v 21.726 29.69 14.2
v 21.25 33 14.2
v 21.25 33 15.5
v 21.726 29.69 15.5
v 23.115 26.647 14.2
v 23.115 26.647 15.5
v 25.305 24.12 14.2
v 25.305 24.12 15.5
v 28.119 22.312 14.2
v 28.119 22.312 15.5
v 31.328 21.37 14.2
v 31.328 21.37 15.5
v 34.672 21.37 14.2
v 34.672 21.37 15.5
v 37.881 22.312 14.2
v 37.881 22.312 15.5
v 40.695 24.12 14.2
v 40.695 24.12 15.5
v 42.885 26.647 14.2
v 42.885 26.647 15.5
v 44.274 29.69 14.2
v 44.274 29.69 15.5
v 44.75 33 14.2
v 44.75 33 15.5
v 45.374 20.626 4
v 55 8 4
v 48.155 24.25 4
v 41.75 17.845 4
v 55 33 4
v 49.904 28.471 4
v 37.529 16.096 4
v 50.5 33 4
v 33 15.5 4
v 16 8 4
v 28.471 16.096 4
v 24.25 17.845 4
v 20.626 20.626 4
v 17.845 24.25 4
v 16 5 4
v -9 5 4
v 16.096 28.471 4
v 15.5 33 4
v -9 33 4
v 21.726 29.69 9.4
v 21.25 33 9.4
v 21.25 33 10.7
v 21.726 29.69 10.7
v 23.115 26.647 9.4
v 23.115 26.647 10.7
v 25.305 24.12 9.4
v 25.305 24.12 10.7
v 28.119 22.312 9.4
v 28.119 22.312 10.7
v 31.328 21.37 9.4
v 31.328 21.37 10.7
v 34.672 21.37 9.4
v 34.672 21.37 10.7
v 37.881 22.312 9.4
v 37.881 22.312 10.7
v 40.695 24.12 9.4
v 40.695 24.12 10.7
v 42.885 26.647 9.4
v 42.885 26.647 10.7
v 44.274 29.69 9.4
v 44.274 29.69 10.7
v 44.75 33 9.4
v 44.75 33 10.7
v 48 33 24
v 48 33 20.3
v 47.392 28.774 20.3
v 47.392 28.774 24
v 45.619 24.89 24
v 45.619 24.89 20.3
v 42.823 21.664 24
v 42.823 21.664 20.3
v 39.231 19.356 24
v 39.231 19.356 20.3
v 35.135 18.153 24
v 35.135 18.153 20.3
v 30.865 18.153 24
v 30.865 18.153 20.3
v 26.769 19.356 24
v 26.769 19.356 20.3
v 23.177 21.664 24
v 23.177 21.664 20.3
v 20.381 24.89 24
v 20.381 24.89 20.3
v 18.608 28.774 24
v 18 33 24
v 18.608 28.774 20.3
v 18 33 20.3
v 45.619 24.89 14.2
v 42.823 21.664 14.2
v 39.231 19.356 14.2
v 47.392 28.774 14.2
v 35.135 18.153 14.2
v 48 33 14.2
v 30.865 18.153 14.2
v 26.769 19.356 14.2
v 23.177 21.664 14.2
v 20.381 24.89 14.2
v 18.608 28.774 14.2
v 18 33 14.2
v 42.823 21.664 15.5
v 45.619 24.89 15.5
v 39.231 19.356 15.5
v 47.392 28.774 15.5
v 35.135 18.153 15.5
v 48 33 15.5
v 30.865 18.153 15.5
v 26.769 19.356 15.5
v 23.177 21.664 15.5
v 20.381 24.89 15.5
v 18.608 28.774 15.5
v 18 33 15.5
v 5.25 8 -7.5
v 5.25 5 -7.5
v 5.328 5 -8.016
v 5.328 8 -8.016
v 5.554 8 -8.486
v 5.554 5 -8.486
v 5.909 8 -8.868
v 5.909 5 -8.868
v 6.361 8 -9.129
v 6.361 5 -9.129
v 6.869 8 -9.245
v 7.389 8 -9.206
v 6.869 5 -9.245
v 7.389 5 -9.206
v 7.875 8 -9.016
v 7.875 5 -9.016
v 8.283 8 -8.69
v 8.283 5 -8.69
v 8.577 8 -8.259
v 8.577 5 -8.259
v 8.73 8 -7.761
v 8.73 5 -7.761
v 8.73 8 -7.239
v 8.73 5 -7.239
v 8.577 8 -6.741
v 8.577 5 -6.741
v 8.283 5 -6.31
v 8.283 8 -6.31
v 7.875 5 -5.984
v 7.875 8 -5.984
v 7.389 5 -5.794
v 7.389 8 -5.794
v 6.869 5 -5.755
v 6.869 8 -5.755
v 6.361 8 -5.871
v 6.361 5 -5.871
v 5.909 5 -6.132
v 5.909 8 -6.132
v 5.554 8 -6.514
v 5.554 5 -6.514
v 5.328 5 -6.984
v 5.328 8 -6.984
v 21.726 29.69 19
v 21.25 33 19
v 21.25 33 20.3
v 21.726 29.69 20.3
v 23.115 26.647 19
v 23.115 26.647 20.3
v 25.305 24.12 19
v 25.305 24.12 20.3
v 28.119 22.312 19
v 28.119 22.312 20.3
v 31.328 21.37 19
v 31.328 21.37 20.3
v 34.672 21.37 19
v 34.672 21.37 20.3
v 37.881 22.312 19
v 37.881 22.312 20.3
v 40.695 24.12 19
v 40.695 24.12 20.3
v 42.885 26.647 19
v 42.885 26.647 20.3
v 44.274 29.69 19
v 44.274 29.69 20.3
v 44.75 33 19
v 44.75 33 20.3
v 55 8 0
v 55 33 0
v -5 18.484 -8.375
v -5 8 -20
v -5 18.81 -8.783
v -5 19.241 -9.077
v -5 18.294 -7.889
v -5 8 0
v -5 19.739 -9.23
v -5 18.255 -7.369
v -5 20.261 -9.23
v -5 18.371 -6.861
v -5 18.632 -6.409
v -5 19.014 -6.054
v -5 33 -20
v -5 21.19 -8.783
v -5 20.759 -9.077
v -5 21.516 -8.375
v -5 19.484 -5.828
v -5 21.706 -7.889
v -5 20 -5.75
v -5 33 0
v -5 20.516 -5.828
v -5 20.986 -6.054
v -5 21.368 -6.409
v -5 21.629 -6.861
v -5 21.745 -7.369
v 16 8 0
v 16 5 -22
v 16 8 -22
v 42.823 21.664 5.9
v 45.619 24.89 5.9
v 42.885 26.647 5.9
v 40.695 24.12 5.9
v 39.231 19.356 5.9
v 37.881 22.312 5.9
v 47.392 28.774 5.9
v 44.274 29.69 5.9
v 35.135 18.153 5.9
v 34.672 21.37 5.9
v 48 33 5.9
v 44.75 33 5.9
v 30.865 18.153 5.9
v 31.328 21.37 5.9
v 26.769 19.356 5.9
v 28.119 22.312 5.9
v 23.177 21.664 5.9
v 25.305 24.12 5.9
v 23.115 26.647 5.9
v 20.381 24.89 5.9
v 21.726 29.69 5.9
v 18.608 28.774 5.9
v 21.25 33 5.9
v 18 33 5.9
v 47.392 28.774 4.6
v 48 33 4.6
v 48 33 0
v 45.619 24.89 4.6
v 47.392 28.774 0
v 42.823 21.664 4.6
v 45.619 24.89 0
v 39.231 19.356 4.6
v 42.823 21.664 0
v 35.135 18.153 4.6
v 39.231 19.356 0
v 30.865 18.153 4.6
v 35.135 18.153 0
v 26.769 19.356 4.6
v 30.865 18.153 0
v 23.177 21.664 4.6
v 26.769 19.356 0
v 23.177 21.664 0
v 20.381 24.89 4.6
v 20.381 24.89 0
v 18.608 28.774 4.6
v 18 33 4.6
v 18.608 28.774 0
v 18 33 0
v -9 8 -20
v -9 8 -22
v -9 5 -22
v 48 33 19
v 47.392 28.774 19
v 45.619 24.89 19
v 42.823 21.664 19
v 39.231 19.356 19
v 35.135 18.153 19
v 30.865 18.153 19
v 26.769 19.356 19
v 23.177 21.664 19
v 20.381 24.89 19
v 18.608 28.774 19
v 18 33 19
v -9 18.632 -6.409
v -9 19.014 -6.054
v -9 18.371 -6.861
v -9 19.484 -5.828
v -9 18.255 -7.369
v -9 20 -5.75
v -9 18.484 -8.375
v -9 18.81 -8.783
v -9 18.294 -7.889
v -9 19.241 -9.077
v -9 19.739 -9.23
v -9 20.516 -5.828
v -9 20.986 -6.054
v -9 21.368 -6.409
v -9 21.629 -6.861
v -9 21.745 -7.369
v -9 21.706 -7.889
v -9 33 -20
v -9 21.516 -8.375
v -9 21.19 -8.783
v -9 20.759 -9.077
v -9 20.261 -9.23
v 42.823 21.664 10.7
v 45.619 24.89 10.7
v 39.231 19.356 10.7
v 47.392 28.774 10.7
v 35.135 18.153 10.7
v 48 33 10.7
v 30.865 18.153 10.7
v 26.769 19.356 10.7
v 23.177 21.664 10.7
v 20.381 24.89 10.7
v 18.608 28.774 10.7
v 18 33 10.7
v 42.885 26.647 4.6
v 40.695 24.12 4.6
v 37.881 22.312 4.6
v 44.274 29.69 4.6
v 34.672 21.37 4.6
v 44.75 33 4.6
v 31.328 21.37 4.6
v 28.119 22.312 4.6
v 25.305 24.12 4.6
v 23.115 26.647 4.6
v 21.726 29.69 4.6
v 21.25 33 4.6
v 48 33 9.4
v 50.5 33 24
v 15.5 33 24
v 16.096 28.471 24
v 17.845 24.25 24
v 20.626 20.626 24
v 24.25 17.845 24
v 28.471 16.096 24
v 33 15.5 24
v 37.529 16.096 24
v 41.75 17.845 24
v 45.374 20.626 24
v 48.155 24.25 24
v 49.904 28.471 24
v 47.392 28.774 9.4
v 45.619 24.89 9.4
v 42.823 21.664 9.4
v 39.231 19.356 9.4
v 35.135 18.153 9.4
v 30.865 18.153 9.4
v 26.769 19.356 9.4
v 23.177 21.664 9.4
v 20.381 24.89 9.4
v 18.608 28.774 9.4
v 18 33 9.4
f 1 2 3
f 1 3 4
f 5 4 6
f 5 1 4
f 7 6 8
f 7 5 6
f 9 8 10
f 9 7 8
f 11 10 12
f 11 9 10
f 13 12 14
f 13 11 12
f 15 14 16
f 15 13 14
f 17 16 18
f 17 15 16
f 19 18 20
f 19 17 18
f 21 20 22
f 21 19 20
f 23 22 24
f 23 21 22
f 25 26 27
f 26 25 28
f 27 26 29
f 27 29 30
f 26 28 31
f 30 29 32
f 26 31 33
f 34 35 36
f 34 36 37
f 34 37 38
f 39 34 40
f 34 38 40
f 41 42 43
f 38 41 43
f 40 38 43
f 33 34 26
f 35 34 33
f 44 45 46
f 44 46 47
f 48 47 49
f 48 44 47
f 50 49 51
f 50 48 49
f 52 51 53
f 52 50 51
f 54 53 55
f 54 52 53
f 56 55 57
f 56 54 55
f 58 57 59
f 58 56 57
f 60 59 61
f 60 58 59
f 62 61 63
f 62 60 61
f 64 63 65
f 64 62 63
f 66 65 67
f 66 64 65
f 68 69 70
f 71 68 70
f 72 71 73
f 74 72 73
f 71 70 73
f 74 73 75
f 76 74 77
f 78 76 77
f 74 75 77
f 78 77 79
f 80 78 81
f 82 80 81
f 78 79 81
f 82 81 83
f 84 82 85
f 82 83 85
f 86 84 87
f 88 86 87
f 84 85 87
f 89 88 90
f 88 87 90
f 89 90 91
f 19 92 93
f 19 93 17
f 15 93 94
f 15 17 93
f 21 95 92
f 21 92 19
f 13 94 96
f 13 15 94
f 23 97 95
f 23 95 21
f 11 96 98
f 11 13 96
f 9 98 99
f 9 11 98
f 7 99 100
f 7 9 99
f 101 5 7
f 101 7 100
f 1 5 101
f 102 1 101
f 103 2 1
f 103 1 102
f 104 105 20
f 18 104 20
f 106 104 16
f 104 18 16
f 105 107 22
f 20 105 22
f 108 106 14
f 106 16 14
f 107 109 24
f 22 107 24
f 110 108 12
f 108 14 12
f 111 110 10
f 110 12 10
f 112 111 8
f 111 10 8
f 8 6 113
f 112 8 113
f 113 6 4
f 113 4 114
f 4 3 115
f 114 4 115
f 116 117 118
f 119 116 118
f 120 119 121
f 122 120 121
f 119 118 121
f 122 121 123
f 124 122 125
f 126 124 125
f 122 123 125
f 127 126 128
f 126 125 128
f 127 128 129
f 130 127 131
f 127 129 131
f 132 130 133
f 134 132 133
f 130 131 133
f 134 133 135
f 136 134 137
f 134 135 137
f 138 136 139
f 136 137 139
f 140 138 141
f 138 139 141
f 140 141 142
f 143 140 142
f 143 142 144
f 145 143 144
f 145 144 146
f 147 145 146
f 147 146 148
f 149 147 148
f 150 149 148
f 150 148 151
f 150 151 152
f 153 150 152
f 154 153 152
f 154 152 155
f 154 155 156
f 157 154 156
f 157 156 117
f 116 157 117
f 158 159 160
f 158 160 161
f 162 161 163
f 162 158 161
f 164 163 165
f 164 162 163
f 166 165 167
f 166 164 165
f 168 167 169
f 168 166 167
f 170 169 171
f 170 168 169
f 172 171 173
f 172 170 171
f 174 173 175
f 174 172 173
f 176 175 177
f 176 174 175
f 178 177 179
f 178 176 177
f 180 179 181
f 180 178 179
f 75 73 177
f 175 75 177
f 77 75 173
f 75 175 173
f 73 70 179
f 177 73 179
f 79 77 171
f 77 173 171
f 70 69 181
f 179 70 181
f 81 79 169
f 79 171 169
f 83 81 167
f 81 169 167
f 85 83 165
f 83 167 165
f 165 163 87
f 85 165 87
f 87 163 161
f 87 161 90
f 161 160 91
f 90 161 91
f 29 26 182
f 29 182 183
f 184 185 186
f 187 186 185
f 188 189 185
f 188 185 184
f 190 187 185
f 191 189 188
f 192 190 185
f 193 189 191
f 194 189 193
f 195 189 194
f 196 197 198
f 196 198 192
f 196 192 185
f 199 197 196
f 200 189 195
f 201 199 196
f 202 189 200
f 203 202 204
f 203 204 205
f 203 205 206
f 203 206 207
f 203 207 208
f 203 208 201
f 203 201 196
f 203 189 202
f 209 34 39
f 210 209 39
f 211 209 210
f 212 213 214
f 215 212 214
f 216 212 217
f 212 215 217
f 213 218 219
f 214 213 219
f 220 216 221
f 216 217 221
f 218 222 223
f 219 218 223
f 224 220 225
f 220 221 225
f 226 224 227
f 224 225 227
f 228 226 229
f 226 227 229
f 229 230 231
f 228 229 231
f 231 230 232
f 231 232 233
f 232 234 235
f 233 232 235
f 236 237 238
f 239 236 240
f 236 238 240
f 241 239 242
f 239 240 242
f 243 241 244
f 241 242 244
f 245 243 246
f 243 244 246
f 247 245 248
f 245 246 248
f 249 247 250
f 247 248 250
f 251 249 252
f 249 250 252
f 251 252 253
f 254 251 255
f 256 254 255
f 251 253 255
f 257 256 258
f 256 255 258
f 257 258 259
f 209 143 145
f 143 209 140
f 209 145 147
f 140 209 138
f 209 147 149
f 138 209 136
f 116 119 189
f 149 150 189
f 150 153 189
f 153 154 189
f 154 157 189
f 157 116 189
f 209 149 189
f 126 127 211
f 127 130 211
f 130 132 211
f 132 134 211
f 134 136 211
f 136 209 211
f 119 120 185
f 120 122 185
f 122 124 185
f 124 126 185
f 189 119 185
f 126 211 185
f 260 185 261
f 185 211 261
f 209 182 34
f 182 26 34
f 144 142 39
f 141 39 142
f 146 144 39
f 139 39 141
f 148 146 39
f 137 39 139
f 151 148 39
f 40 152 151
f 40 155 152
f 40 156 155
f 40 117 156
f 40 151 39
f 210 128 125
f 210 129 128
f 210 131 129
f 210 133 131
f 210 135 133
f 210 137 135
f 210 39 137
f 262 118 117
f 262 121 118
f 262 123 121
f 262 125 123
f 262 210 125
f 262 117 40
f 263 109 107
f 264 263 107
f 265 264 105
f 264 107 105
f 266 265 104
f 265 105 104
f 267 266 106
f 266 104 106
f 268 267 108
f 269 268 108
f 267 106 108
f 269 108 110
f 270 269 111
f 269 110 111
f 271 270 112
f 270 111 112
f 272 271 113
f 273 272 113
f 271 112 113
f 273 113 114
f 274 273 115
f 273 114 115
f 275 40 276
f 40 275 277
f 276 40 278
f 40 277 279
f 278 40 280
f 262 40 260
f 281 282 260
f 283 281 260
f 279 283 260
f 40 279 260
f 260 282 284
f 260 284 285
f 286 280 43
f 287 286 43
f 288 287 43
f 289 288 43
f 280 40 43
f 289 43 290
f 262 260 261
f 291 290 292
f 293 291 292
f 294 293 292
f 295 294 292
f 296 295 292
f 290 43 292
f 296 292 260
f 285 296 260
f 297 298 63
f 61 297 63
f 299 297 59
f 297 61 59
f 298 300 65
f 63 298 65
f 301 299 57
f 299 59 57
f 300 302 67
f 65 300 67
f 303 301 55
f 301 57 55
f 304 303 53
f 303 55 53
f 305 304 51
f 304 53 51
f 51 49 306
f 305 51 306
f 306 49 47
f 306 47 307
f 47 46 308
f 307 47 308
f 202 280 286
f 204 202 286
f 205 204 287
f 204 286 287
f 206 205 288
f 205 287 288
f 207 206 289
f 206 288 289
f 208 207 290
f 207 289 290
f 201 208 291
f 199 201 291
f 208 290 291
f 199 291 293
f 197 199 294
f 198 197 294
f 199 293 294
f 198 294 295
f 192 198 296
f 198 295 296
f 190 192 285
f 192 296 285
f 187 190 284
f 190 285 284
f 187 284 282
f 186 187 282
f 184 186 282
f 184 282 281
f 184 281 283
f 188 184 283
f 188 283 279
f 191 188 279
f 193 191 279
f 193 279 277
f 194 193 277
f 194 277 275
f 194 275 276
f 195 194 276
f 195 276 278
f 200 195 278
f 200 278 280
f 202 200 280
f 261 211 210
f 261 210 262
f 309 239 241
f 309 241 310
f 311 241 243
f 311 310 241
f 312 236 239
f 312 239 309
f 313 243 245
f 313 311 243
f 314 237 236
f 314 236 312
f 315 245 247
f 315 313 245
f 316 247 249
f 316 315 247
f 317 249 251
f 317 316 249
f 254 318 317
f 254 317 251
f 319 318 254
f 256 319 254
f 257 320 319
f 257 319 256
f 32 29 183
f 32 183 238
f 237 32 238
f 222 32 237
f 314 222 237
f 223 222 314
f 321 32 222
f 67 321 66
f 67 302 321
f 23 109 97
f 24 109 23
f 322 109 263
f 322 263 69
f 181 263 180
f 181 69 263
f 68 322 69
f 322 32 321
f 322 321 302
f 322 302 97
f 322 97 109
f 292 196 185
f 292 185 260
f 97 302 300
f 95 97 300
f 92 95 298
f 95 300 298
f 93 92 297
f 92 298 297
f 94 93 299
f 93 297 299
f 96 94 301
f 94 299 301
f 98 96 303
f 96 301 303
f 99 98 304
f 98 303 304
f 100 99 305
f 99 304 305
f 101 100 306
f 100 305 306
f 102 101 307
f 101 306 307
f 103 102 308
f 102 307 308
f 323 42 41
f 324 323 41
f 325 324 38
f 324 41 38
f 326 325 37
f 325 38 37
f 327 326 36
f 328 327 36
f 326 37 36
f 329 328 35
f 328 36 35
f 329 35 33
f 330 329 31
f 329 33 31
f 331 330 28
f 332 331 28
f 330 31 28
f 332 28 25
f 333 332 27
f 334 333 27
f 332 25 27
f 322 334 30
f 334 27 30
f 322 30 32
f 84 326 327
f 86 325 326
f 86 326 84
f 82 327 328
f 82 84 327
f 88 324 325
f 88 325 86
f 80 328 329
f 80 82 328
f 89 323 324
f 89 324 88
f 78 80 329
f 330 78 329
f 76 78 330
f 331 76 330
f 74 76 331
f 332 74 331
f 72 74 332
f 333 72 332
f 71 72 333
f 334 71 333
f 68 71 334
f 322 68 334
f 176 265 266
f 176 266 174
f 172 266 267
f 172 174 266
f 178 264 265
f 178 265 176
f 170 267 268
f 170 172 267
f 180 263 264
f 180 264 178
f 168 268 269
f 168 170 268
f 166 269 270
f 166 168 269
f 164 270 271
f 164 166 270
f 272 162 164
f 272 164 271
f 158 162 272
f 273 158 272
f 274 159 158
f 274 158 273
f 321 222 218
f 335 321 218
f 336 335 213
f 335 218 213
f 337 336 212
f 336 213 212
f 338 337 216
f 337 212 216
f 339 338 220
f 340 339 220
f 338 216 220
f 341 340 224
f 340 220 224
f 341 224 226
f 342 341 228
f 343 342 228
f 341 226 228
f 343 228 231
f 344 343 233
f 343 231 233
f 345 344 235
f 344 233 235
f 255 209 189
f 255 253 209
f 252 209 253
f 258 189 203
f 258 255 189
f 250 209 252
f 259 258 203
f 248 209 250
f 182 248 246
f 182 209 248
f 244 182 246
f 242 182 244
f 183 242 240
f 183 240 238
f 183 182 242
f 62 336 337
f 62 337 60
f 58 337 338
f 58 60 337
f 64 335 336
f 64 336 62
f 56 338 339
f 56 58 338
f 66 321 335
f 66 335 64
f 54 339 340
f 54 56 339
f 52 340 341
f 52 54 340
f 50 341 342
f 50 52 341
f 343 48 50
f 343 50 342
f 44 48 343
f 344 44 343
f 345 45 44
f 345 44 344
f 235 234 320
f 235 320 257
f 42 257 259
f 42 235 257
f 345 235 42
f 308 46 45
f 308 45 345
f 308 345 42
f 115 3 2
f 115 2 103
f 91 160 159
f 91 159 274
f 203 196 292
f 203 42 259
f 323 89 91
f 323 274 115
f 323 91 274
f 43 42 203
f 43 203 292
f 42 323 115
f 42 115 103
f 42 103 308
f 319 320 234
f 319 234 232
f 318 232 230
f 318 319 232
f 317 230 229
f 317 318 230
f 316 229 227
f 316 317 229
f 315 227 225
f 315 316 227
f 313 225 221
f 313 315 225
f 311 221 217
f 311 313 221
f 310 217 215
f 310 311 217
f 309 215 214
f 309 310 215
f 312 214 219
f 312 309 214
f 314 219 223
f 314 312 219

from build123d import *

# Parameters (mm, degrees)
SKETCH1_W            = 66
SKETCH1_H            = 33
BOSS_EXTRUDE1_DEPTH  = 4
CUT_EXTRUDE1_DEPTH   = 5
BOSS_EXTRUDE2_DEPTH  = 20
BOSS_EXTRUDE3_DEPTH  = 1.3
BOSS_EXTRUDE4_DEPTH  = 1.3
BOSS_EXTRUDE5_DEPTH  = 1.3
BOSS_EXTRUDE6_DEPTH  = 1.3
SKETCH11_W           = 66
SKETCH11_H           = 8
CUT_EXTRUDE4_DEPTH   = 10
SKETCH13_W           = 4
SKETCH13_H           = 25
BOSS_EXTRUDE7_DEPTH  = 9
SKETCH14_W           = 4
SKETCH14_H           = 25
BOSS_EXTRUDE8_DEPTH  = 8
SKETCH16_R           = 1.75
CUT_EXTRUDE5_DEPTH   = 12
SKETCH17_R           = 1.75
CUT_EXTRUDE8_DEPTH   = 12
SKETCH18_W           = 4
SKETCH18_H           = 25
CUT_EXTRUDE9_DEPTH   = 3
SKETCH19_W           = 4
SKETCH19_H           = 25
BOSS_EXTRUDE10_DEPTH = 4
SKETCH20_W           = 4
SKETCH20_H           = 25
BOSS_EXTRUDE11_DEPTH = 20
SKETCH21_R           = 1.75
CUT_EXTRUDE10_DEPTH  = 20
SKETCH22_W           = 20
SKETCH22_H           = 25
CUT_EXTRUDE11_DEPTH  = 20
SKETCH23_W           = 4
SKETCH23_H           = 25
BOSS_EXTRUDE12_DEPTH = 20
SKETCH24_R           = 1.75
CUT_EXTRUDE12_DEPTH  = 85
SKETCH25_W           = 25
SKETCH25_H           = 26
BOSS_EXTRUDE13_DEPTH = 3
SKETCH26_R           = 1.75
CUT_EXTRUDE13_DEPTH  = 29
SKETCH27_W           = 20
SKETCH27_H           = 25
CUT_EXTRUDE14_DEPTH  = 27


with BuildPart() as part:
    # Sketch1 → Boss-Extrude1 (new body)
    with BuildSketch(Plane.XY):
        with Locations((33, 16.5)):
            Rectangle(SKETCH1_W, SKETCH1_H)
    extrude(amount=BOSS_EXTRUDE1_DEPTH)

    # Sketch2 → Cut-Extrude1 (cut, through all)
    with BuildSketch(Plane.XY.offset(4)):
        with BuildLine():
            Line((18, 33), (48, 33))
            ThreePointArc((48, 33), (33, 18), (18, 33))
        make_face()
    extrude(amount=-CUT_EXTRUDE1_DEPTH, mode=Mode.SUBTRACT)

    # Sketch3 → Boss-Extrude2 (add)
    with BuildSketch(Plane.XY.offset(4)):
        with BuildLine():
            Line((18, 33), (15.5, 33))
            ThreePointArc((15.5, 33), (33, 15.5), (50.5, 33))
            Line((50.5, 33), (48, 33))
            ThreePointArc((48, 33), (33, 18), (18, 33))
        make_face()
    extrude(amount=BOSS_EXTRUDE2_DEPTH)

    # Sketch5 → Boss-Extrude3 (add)
    with BuildSketch(Plane.XY.offset(4.6)):
        with BuildLine():
            Line((18, 33), (21.25, 33))
            ThreePointArc((21.25, 33), (33, 21.25), (44.75, 33))
            Line((44.75, 33), (48, 33))
            ThreePointArc((48, 33), (33, 18), (18, 33))
        make_face()
    extrude(amount=BOSS_EXTRUDE3_DEPTH)

    # Sketch6 → Boss-Extrude4 (add)
    with BuildSketch(Plane.XY.offset(9.4)):
        with BuildLine():
            Line((18, 33), (21.25, 33))
            ThreePointArc((21.25, 33), (33, 21.25), (44.75, 33))
            Line((44.75, 33), (48, 33))
            ThreePointArc((48, 33), (33, 18), (18, 33))
        make_face()
    extrude(amount=BOSS_EXTRUDE4_DEPTH)

    # Sketch7 → Boss-Extrude5 (add)
    with BuildSketch(Plane.XY.offset(14.2)):
        with BuildLine():
            Line((18, 33), (21.25, 33))
            ThreePointArc((21.25, 33), (33, 21.25), (44.75, 33))
            Line((44.75, 33), (48, 33))
            ThreePointArc((48, 33), (33, 18), (18, 33))
        make_face()
    extrude(amount=BOSS_EXTRUDE5_DEPTH)

    # Sketch8 → Boss-Extrude6 (add)
    with BuildSketch(Plane.XY.offset(19)):
        with BuildLine():
            Line((18, 33), (21.25, 33))
            ThreePointArc((21.25, 33), (33, 21.25), (44.75, 33))
            Line((44.75, 33), (48, 33))
            ThreePointArc((48, 33), (33, 18), (18, 33))
        make_face()
    extrude(amount=BOSS_EXTRUDE6_DEPTH)

    # Sketch11 → Cut-Extrude4 (cut)
    with BuildSketch(Plane.XY.offset(4)):
        with Locations((33, 4)):
            Rectangle(SKETCH11_W, SKETCH11_H)
    extrude(amount=-CUT_EXTRUDE4_DEPTH, mode=Mode.SUBTRACT)

    # Sketch13 → Boss-Extrude7 (add)
    with BuildSketch(Plane.ZY):
        with Locations((2, 20.5)):
            Rectangle(SKETCH13_W, SKETCH13_H)
    extrude(amount=BOSS_EXTRUDE7_DEPTH)

    # Sketch14 → Boss-Extrude8 (add)
    with BuildSketch(Plane(origin=(66, 0, 0), x_dir=(0, 0, -1), z_dir=(1, 0, 0))):
        with Locations((-2, 20.5)):
            Rectangle(SKETCH14_W, SKETCH14_H)
    extrude(amount=BOSS_EXTRUDE8_DEPTH)

    # Sketch16 → Cut-Extrude5 (cut)
    with BuildSketch(Plane(origin=(74, 0, 0), x_dir=(0, 0, -1), z_dir=(1, 0, 0))):
        with Locations((14, 13)):
            Circle(SKETCH16_R)
    extrude(amount=-CUT_EXTRUDE5_DEPTH, mode=Mode.SUBTRACT)

    # Sketch17 → Cut-Extrude8 (cut)
    with BuildSketch(Plane.XY.offset(4)):
        with Locations((59, 13)):
            Circle(SKETCH17_R)
    extrude(amount=-CUT_EXTRUDE8_DEPTH, mode=Mode.SUBTRACT)

    # Sketch18 → Cut-Extrude9 (cut)
    with BuildSketch(Plane(origin=(74, 0, 0), x_dir=(0, 0, -1), z_dir=(1, 0, 0))):
        with Locations((-2, 20.5)):
            Rectangle(SKETCH18_W, SKETCH18_H)
    extrude(amount=-CUT_EXTRUDE9_DEPTH, mode=Mode.SUBTRACT)

    # Sketch19 → Boss-Extrude10 (add)
    with BuildSketch(Plane(origin=(71, 0, 0), x_dir=(0, 0, -1), z_dir=(1, 0, 0))):
        with Locations((-2, 20.5)):
            Rectangle(SKETCH19_W, SKETCH19_H)
    extrude(amount=BOSS_EXTRUDE10_DEPTH)

    # Sketch20 → Boss-Extrude11 (add)
    with BuildSketch(Plane(origin=(0, 0, 0), x_dir=(-1, 0, 0), z_dir=(0, 0, -1))):
        with Locations((-73, 20.5)):
            Rectangle(SKETCH20_W, SKETCH20_H)
    extrude(amount=BOSS_EXTRUDE11_DEPTH)

    # Sketch21 → Cut-Extrude10 (cut)
    with BuildSketch(Plane(origin=(75, 0, 0), x_dir=(0, 0, -1), z_dir=(1, 0, 0))):
        with Locations((14, 13)):
            Circle(SKETCH21_R)
    extrude(amount=-CUT_EXTRUDE10_DEPTH, mode=Mode.SUBTRACT)

    # Sketch22 → Cut-Extrude11 (cut)
    with BuildSketch(Plane(origin=(75, 0, 0), x_dir=(0, 0, -1), z_dir=(1, 0, 0))):
        with Locations((10, 20.5)):
            Rectangle(SKETCH22_W, SKETCH22_H)
    extrude(amount=-CUT_EXTRUDE11_DEPTH, mode=Mode.SUBTRACT)

    # Sketch23 → Boss-Extrude12 (add)
    with BuildSketch(Plane(origin=(0, 0, 0), x_dir=(-1, 0, 0), z_dir=(0, 0, -1))):
        with Locations((7, 20.5)):
            Rectangle(SKETCH23_W, SKETCH23_H)
    extrude(amount=BOSS_EXTRUDE12_DEPTH)

    # Sketch24 → Cut-Extrude12 (cut, through all)
    with BuildSketch(Plane.ZY.offset(9)):
        with Locations((-7.5, 20)):
            Circle(SKETCH24_R)
    extrude(amount=-CUT_EXTRUDE12_DEPTH, mode=Mode.SUBTRACT)

    # Sketch25 → Boss-Extrude13 (add)
    with BuildSketch(Plane(origin=(0, 8, 0), x_dir=(-1, 0, 0), z_dir=(0, -1, 0))):
        with Locations((-3.5, 9)):
            Rectangle(SKETCH25_W, SKETCH25_H)
    extrude(amount=BOSS_EXTRUDE13_DEPTH)

    # Sketch26 → Cut-Extrude13 (cut, through all)
    with BuildSketch(Plane(origin=(0, 5, 0), x_dir=(-1, 0, 0), z_dir=(0, -1, 0))):
        with Locations((-7, 7.5)):
            Circle(SKETCH26_R)
    extrude(amount=-CUT_EXTRUDE13_DEPTH, mode=Mode.SUBTRACT)

    # Sketch27 → Cut-Extrude14 (cut, through all)
    with BuildSketch(Plane.XY.offset(4)):
        with Locations((65, 20.5)):
            Rectangle(SKETCH27_W, SKETCH27_H)
    extrude(amount=-CUT_EXTRUDE14_DEPTH, mode=Mode.SUBTRACT)


solid = part.part
